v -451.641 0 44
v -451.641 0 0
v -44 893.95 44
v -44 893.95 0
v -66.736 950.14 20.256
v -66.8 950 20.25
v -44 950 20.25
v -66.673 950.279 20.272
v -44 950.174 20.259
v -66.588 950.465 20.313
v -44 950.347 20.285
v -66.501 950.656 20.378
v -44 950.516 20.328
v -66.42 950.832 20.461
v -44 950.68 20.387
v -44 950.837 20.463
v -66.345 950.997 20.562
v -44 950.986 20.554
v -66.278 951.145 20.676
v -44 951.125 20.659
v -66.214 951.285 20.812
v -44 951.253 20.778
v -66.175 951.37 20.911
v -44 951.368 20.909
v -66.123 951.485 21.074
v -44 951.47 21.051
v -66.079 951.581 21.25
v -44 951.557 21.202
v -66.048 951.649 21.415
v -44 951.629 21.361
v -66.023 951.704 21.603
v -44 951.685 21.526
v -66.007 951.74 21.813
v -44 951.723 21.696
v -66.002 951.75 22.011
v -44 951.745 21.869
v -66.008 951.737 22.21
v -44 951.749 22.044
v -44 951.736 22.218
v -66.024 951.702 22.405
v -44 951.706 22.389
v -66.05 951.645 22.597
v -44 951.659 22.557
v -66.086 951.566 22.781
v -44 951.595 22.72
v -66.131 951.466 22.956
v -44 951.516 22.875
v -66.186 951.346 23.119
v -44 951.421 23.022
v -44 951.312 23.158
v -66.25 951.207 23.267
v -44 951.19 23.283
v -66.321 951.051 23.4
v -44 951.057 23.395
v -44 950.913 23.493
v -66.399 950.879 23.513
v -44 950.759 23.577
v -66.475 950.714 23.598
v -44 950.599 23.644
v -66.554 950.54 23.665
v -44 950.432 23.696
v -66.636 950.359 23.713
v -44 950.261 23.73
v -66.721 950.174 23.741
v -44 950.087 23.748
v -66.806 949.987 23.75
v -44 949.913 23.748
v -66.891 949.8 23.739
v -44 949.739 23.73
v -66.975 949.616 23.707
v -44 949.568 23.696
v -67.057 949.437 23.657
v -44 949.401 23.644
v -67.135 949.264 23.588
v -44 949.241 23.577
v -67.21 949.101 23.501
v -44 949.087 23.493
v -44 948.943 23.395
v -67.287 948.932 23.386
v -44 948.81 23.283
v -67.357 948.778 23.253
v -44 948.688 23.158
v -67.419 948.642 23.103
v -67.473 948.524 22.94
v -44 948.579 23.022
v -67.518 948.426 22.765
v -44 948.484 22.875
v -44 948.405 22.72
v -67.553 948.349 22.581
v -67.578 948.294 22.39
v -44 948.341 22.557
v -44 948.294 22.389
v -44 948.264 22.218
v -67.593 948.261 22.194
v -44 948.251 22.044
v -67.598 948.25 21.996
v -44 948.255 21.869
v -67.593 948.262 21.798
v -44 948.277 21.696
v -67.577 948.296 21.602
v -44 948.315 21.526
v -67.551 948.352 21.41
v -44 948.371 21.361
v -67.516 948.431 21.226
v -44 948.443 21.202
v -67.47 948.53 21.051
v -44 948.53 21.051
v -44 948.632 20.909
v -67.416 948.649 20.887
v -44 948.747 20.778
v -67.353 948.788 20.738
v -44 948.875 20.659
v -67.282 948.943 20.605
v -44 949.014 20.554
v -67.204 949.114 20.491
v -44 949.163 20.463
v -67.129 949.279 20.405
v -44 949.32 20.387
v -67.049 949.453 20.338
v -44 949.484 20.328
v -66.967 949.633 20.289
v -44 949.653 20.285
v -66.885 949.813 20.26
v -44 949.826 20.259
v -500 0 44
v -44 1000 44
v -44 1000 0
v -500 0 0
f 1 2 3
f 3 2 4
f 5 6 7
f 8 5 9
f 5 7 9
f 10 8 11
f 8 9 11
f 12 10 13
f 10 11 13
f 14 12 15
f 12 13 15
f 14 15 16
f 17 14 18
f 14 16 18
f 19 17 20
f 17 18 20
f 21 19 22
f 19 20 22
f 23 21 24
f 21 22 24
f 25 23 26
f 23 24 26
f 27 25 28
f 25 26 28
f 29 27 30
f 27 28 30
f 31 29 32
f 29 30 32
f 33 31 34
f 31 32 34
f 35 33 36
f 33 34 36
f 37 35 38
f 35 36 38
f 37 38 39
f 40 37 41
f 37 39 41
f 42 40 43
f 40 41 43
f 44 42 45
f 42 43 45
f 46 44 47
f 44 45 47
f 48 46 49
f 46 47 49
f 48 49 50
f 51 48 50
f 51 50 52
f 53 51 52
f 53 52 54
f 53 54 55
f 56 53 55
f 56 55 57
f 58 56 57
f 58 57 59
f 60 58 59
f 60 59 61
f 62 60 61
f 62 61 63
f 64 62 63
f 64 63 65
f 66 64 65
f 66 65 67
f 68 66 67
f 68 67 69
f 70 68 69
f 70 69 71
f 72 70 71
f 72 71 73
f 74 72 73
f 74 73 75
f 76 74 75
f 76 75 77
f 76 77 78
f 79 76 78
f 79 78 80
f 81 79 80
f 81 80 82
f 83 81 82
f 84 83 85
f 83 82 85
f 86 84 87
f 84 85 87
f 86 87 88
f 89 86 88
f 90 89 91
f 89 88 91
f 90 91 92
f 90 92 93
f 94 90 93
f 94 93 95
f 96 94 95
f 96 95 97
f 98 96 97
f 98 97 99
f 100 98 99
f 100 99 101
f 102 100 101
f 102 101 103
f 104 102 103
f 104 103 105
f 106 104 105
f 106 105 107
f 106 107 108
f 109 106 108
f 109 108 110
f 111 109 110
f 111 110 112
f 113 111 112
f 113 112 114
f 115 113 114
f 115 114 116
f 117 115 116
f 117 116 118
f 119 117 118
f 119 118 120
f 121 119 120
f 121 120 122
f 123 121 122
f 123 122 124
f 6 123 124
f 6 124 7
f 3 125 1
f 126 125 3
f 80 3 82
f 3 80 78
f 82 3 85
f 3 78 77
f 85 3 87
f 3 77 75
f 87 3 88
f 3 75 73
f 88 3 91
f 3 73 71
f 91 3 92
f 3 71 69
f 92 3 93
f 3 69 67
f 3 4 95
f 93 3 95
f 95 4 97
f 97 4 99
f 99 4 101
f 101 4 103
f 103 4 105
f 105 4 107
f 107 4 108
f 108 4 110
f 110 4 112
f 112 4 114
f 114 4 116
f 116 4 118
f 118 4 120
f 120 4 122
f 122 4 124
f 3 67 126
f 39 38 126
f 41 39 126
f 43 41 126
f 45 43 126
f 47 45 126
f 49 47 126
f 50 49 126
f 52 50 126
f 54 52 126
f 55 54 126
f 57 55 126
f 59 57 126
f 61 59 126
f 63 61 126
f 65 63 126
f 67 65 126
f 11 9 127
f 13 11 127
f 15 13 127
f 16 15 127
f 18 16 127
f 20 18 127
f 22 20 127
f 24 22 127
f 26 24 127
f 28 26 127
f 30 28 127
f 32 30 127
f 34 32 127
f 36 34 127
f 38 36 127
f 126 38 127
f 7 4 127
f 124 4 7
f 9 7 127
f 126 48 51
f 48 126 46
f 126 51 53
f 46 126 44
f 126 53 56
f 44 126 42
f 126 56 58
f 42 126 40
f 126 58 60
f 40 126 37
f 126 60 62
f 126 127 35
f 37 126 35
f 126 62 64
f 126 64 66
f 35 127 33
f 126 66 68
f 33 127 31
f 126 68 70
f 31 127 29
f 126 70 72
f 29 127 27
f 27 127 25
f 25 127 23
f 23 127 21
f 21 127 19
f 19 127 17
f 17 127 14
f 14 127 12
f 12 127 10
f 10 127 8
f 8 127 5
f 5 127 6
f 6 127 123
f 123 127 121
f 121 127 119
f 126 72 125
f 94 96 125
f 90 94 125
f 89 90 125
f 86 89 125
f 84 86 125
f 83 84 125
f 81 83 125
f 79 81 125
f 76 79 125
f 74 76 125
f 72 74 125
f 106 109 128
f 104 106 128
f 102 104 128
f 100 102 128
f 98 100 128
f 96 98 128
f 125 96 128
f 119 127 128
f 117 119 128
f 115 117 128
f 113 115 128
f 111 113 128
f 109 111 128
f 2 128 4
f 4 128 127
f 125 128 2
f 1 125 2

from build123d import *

# Parameters (mm, degrees)
BOSS_EXTRU_1_DEPTH      = 44
ENL_V_MAT_EXTRU_1_REACH = 458
ESQUISSE2_R             = 1.75


with BuildPart() as part:
    # Esquisse1 → Boss.-Extru.1 (new body)
    with BuildSketch(Plane.XY):
        Polygon((-44, 1000), (-500, 0), (-451.641297619, 0), (-44, 893.950214076), align=None)
    extrude(amount=BOSS_EXTRU_1_DEPTH)

    # Enlèv. mat.-Extru.1: up to this face of the body (flat: up to its plane)
    enl_v_mat_extru_1_end = Plane(part.part.faces().sort_by_distance((-272, 500, 22))[0])
    # Esquisse2 → Enlèv. mat.-Extru.1 (cut, up to the picked face)
    with BuildSketch(Plane(origin=(-44, 0, 0), x_dir=(0, 0, -1), z_dir=(1, 0, 0)), mode=Mode.PRIVATE) as enl_v_mat_extru_1_sk1:
        with Locations((-22, 950)):
            Circle(ESQUISSE2_R)
    enl_v_mat_extru_1_tool1 = split(extrude(enl_v_mat_extru_1_sk1.sketch, amount=-ENL_V_MAT_EXTRU_1_REACH, mode=Mode.PRIVATE), bisect_by=enl_v_mat_extru_1_end, keep=Keep.BOTH, mode=Mode.PRIVATE)
    add(enl_v_mat_extru_1_tool1.solids().sort_by_distance((-44, 950, 22))[0], mode=Mode.SUBTRACT)


solid = part.part
